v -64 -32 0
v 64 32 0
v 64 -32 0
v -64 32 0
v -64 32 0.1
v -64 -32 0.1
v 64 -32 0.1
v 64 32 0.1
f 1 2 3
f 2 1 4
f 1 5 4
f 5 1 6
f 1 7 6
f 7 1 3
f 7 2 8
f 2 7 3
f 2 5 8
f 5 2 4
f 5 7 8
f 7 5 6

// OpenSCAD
// file: ../p/box5-12.scad
use <../lib.scad>
function ldraw_lib__box5_12() = [
// 0 Box with 5 Faces without Any Edges
// 0 Name: box5-12.dat
// 0 Author: Chris Dee [cwdee]
// 0 !LDRAW_ORG Primitive UPDATE 2009-02
// 0 !LICENSE Licensed under CC BY 2.0 and CC BY 4.0 : see CAreadme.txt
// 
// 0 BFC CERTIFY CCW
  [0,"BFC","CERTIFY"],
  [0,"BFC","CCW"],
// 
// 0 !HISTORY 2009-09-03 [PTadmin] Official Update 2009-02
// 
// 
// 4 16 1 1 1 1 1 -1 -1 1 -1 -1 1 1
  [4,16,1,1,1,1,1,-1,-1,1,-1,-1,1,1],
// 4 16 -1 0 1 1 0 1 1 1 1 -1 1 1
  [4,16,-1,0,1,1,0,1,1,1,1,-1,1,1],
// 4 16 -1 0 -1 -1 0 1 -1 1 1 -1 1 -1
  [4,16,-1,0,-1,-1,0,1,-1,1,1,-1,1,-1],
// 4 16 1 0 -1 -1 0 -1 -1 1 -1 1 1 -1
  [4,16,1,0,-1,-1,0,-1,-1,1,-1,1,1,-1],
// 4 16 1 0 1 1 0 -1 1 1 -1 1 1 1
  [4,16,1,0,1,1,0,-1,1,1,-1,1,1,1],
// 0
];
module ldraw_lib__box5_12(step=0, col=false, unit=2/5, alt=false, line=0.2, solid=!$preview)
    makepoly(ldraw_lib__box5_12(), step=step, col=col, unit=unit, alt=alt, line=line, solid=solid);
ldraw_lib__box5_12(line=0.2);
// main file
use <../lib.scad>
use <../p/box5-12.scad>
function ldraw_lib__6115204a() = [
// 0 Sticker  8 x 16 with SHIELD Helicarrier
// 0 Name: 6115204a.dat
// 0 Author: Marc Giraudet [Mad_Marc]
// 0 !LDRAW_ORG Part UPDATE 2022-02
// 0 !LICENSE Licensed under CC BY 2.0 and CC BY 4.0 : see CAreadme.txt
// 
// 0 BFC CERTIFY CCW
  [0,"BFC","CERTIFY"],
  [0,"BFC","CCW"],
// 
// 0 !KEYWORDS Set 76042
// 
// 0 !HISTORY 2022-03-06 [PTadmin] Official Update 2022-02
// 
// 
// 1 16 0 -0.25 0 0 0 -160 0 0.25 0 80 0 0 box5-12.dat
  [1,16,0,-0.25,0,0,0,-160,0,0.25,0,80,0,0, ldraw_lib__box5_12()],
// 0 !TEXMAP START PLANAR -160 -0.25 80 160 -0.25 80 -160 -0.25 -80 6115204a.png
// 0 !: 4 0 -160 -0.25 80 -160 -0.25 -80 160 -0.25 -80 160 -0.25 80
// 0 !TEXMAP FALLBACK
// 0 // Needs Work: fallback pattern
// 4 0 -160 -0.25 80 -160 -0.25 -80 160 -0.25 -80 160 -0.25 80
  [4,0,-160,-0.25,80,-160,-0.25,-80,160,-0.25,-80,160,-0.25,80],
// 0 !TEXMAP END
];
module ldraw_lib__6115204a(step=0, col=false, unit=2/5, alt=false, line=0.2, solid=!$preview)
    makepoly(ldraw_lib__6115204a(), step=step, col=col, unit=unit, alt=alt, line=line, solid=solid);
ldraw_lib__6115204a(line=0.2);
